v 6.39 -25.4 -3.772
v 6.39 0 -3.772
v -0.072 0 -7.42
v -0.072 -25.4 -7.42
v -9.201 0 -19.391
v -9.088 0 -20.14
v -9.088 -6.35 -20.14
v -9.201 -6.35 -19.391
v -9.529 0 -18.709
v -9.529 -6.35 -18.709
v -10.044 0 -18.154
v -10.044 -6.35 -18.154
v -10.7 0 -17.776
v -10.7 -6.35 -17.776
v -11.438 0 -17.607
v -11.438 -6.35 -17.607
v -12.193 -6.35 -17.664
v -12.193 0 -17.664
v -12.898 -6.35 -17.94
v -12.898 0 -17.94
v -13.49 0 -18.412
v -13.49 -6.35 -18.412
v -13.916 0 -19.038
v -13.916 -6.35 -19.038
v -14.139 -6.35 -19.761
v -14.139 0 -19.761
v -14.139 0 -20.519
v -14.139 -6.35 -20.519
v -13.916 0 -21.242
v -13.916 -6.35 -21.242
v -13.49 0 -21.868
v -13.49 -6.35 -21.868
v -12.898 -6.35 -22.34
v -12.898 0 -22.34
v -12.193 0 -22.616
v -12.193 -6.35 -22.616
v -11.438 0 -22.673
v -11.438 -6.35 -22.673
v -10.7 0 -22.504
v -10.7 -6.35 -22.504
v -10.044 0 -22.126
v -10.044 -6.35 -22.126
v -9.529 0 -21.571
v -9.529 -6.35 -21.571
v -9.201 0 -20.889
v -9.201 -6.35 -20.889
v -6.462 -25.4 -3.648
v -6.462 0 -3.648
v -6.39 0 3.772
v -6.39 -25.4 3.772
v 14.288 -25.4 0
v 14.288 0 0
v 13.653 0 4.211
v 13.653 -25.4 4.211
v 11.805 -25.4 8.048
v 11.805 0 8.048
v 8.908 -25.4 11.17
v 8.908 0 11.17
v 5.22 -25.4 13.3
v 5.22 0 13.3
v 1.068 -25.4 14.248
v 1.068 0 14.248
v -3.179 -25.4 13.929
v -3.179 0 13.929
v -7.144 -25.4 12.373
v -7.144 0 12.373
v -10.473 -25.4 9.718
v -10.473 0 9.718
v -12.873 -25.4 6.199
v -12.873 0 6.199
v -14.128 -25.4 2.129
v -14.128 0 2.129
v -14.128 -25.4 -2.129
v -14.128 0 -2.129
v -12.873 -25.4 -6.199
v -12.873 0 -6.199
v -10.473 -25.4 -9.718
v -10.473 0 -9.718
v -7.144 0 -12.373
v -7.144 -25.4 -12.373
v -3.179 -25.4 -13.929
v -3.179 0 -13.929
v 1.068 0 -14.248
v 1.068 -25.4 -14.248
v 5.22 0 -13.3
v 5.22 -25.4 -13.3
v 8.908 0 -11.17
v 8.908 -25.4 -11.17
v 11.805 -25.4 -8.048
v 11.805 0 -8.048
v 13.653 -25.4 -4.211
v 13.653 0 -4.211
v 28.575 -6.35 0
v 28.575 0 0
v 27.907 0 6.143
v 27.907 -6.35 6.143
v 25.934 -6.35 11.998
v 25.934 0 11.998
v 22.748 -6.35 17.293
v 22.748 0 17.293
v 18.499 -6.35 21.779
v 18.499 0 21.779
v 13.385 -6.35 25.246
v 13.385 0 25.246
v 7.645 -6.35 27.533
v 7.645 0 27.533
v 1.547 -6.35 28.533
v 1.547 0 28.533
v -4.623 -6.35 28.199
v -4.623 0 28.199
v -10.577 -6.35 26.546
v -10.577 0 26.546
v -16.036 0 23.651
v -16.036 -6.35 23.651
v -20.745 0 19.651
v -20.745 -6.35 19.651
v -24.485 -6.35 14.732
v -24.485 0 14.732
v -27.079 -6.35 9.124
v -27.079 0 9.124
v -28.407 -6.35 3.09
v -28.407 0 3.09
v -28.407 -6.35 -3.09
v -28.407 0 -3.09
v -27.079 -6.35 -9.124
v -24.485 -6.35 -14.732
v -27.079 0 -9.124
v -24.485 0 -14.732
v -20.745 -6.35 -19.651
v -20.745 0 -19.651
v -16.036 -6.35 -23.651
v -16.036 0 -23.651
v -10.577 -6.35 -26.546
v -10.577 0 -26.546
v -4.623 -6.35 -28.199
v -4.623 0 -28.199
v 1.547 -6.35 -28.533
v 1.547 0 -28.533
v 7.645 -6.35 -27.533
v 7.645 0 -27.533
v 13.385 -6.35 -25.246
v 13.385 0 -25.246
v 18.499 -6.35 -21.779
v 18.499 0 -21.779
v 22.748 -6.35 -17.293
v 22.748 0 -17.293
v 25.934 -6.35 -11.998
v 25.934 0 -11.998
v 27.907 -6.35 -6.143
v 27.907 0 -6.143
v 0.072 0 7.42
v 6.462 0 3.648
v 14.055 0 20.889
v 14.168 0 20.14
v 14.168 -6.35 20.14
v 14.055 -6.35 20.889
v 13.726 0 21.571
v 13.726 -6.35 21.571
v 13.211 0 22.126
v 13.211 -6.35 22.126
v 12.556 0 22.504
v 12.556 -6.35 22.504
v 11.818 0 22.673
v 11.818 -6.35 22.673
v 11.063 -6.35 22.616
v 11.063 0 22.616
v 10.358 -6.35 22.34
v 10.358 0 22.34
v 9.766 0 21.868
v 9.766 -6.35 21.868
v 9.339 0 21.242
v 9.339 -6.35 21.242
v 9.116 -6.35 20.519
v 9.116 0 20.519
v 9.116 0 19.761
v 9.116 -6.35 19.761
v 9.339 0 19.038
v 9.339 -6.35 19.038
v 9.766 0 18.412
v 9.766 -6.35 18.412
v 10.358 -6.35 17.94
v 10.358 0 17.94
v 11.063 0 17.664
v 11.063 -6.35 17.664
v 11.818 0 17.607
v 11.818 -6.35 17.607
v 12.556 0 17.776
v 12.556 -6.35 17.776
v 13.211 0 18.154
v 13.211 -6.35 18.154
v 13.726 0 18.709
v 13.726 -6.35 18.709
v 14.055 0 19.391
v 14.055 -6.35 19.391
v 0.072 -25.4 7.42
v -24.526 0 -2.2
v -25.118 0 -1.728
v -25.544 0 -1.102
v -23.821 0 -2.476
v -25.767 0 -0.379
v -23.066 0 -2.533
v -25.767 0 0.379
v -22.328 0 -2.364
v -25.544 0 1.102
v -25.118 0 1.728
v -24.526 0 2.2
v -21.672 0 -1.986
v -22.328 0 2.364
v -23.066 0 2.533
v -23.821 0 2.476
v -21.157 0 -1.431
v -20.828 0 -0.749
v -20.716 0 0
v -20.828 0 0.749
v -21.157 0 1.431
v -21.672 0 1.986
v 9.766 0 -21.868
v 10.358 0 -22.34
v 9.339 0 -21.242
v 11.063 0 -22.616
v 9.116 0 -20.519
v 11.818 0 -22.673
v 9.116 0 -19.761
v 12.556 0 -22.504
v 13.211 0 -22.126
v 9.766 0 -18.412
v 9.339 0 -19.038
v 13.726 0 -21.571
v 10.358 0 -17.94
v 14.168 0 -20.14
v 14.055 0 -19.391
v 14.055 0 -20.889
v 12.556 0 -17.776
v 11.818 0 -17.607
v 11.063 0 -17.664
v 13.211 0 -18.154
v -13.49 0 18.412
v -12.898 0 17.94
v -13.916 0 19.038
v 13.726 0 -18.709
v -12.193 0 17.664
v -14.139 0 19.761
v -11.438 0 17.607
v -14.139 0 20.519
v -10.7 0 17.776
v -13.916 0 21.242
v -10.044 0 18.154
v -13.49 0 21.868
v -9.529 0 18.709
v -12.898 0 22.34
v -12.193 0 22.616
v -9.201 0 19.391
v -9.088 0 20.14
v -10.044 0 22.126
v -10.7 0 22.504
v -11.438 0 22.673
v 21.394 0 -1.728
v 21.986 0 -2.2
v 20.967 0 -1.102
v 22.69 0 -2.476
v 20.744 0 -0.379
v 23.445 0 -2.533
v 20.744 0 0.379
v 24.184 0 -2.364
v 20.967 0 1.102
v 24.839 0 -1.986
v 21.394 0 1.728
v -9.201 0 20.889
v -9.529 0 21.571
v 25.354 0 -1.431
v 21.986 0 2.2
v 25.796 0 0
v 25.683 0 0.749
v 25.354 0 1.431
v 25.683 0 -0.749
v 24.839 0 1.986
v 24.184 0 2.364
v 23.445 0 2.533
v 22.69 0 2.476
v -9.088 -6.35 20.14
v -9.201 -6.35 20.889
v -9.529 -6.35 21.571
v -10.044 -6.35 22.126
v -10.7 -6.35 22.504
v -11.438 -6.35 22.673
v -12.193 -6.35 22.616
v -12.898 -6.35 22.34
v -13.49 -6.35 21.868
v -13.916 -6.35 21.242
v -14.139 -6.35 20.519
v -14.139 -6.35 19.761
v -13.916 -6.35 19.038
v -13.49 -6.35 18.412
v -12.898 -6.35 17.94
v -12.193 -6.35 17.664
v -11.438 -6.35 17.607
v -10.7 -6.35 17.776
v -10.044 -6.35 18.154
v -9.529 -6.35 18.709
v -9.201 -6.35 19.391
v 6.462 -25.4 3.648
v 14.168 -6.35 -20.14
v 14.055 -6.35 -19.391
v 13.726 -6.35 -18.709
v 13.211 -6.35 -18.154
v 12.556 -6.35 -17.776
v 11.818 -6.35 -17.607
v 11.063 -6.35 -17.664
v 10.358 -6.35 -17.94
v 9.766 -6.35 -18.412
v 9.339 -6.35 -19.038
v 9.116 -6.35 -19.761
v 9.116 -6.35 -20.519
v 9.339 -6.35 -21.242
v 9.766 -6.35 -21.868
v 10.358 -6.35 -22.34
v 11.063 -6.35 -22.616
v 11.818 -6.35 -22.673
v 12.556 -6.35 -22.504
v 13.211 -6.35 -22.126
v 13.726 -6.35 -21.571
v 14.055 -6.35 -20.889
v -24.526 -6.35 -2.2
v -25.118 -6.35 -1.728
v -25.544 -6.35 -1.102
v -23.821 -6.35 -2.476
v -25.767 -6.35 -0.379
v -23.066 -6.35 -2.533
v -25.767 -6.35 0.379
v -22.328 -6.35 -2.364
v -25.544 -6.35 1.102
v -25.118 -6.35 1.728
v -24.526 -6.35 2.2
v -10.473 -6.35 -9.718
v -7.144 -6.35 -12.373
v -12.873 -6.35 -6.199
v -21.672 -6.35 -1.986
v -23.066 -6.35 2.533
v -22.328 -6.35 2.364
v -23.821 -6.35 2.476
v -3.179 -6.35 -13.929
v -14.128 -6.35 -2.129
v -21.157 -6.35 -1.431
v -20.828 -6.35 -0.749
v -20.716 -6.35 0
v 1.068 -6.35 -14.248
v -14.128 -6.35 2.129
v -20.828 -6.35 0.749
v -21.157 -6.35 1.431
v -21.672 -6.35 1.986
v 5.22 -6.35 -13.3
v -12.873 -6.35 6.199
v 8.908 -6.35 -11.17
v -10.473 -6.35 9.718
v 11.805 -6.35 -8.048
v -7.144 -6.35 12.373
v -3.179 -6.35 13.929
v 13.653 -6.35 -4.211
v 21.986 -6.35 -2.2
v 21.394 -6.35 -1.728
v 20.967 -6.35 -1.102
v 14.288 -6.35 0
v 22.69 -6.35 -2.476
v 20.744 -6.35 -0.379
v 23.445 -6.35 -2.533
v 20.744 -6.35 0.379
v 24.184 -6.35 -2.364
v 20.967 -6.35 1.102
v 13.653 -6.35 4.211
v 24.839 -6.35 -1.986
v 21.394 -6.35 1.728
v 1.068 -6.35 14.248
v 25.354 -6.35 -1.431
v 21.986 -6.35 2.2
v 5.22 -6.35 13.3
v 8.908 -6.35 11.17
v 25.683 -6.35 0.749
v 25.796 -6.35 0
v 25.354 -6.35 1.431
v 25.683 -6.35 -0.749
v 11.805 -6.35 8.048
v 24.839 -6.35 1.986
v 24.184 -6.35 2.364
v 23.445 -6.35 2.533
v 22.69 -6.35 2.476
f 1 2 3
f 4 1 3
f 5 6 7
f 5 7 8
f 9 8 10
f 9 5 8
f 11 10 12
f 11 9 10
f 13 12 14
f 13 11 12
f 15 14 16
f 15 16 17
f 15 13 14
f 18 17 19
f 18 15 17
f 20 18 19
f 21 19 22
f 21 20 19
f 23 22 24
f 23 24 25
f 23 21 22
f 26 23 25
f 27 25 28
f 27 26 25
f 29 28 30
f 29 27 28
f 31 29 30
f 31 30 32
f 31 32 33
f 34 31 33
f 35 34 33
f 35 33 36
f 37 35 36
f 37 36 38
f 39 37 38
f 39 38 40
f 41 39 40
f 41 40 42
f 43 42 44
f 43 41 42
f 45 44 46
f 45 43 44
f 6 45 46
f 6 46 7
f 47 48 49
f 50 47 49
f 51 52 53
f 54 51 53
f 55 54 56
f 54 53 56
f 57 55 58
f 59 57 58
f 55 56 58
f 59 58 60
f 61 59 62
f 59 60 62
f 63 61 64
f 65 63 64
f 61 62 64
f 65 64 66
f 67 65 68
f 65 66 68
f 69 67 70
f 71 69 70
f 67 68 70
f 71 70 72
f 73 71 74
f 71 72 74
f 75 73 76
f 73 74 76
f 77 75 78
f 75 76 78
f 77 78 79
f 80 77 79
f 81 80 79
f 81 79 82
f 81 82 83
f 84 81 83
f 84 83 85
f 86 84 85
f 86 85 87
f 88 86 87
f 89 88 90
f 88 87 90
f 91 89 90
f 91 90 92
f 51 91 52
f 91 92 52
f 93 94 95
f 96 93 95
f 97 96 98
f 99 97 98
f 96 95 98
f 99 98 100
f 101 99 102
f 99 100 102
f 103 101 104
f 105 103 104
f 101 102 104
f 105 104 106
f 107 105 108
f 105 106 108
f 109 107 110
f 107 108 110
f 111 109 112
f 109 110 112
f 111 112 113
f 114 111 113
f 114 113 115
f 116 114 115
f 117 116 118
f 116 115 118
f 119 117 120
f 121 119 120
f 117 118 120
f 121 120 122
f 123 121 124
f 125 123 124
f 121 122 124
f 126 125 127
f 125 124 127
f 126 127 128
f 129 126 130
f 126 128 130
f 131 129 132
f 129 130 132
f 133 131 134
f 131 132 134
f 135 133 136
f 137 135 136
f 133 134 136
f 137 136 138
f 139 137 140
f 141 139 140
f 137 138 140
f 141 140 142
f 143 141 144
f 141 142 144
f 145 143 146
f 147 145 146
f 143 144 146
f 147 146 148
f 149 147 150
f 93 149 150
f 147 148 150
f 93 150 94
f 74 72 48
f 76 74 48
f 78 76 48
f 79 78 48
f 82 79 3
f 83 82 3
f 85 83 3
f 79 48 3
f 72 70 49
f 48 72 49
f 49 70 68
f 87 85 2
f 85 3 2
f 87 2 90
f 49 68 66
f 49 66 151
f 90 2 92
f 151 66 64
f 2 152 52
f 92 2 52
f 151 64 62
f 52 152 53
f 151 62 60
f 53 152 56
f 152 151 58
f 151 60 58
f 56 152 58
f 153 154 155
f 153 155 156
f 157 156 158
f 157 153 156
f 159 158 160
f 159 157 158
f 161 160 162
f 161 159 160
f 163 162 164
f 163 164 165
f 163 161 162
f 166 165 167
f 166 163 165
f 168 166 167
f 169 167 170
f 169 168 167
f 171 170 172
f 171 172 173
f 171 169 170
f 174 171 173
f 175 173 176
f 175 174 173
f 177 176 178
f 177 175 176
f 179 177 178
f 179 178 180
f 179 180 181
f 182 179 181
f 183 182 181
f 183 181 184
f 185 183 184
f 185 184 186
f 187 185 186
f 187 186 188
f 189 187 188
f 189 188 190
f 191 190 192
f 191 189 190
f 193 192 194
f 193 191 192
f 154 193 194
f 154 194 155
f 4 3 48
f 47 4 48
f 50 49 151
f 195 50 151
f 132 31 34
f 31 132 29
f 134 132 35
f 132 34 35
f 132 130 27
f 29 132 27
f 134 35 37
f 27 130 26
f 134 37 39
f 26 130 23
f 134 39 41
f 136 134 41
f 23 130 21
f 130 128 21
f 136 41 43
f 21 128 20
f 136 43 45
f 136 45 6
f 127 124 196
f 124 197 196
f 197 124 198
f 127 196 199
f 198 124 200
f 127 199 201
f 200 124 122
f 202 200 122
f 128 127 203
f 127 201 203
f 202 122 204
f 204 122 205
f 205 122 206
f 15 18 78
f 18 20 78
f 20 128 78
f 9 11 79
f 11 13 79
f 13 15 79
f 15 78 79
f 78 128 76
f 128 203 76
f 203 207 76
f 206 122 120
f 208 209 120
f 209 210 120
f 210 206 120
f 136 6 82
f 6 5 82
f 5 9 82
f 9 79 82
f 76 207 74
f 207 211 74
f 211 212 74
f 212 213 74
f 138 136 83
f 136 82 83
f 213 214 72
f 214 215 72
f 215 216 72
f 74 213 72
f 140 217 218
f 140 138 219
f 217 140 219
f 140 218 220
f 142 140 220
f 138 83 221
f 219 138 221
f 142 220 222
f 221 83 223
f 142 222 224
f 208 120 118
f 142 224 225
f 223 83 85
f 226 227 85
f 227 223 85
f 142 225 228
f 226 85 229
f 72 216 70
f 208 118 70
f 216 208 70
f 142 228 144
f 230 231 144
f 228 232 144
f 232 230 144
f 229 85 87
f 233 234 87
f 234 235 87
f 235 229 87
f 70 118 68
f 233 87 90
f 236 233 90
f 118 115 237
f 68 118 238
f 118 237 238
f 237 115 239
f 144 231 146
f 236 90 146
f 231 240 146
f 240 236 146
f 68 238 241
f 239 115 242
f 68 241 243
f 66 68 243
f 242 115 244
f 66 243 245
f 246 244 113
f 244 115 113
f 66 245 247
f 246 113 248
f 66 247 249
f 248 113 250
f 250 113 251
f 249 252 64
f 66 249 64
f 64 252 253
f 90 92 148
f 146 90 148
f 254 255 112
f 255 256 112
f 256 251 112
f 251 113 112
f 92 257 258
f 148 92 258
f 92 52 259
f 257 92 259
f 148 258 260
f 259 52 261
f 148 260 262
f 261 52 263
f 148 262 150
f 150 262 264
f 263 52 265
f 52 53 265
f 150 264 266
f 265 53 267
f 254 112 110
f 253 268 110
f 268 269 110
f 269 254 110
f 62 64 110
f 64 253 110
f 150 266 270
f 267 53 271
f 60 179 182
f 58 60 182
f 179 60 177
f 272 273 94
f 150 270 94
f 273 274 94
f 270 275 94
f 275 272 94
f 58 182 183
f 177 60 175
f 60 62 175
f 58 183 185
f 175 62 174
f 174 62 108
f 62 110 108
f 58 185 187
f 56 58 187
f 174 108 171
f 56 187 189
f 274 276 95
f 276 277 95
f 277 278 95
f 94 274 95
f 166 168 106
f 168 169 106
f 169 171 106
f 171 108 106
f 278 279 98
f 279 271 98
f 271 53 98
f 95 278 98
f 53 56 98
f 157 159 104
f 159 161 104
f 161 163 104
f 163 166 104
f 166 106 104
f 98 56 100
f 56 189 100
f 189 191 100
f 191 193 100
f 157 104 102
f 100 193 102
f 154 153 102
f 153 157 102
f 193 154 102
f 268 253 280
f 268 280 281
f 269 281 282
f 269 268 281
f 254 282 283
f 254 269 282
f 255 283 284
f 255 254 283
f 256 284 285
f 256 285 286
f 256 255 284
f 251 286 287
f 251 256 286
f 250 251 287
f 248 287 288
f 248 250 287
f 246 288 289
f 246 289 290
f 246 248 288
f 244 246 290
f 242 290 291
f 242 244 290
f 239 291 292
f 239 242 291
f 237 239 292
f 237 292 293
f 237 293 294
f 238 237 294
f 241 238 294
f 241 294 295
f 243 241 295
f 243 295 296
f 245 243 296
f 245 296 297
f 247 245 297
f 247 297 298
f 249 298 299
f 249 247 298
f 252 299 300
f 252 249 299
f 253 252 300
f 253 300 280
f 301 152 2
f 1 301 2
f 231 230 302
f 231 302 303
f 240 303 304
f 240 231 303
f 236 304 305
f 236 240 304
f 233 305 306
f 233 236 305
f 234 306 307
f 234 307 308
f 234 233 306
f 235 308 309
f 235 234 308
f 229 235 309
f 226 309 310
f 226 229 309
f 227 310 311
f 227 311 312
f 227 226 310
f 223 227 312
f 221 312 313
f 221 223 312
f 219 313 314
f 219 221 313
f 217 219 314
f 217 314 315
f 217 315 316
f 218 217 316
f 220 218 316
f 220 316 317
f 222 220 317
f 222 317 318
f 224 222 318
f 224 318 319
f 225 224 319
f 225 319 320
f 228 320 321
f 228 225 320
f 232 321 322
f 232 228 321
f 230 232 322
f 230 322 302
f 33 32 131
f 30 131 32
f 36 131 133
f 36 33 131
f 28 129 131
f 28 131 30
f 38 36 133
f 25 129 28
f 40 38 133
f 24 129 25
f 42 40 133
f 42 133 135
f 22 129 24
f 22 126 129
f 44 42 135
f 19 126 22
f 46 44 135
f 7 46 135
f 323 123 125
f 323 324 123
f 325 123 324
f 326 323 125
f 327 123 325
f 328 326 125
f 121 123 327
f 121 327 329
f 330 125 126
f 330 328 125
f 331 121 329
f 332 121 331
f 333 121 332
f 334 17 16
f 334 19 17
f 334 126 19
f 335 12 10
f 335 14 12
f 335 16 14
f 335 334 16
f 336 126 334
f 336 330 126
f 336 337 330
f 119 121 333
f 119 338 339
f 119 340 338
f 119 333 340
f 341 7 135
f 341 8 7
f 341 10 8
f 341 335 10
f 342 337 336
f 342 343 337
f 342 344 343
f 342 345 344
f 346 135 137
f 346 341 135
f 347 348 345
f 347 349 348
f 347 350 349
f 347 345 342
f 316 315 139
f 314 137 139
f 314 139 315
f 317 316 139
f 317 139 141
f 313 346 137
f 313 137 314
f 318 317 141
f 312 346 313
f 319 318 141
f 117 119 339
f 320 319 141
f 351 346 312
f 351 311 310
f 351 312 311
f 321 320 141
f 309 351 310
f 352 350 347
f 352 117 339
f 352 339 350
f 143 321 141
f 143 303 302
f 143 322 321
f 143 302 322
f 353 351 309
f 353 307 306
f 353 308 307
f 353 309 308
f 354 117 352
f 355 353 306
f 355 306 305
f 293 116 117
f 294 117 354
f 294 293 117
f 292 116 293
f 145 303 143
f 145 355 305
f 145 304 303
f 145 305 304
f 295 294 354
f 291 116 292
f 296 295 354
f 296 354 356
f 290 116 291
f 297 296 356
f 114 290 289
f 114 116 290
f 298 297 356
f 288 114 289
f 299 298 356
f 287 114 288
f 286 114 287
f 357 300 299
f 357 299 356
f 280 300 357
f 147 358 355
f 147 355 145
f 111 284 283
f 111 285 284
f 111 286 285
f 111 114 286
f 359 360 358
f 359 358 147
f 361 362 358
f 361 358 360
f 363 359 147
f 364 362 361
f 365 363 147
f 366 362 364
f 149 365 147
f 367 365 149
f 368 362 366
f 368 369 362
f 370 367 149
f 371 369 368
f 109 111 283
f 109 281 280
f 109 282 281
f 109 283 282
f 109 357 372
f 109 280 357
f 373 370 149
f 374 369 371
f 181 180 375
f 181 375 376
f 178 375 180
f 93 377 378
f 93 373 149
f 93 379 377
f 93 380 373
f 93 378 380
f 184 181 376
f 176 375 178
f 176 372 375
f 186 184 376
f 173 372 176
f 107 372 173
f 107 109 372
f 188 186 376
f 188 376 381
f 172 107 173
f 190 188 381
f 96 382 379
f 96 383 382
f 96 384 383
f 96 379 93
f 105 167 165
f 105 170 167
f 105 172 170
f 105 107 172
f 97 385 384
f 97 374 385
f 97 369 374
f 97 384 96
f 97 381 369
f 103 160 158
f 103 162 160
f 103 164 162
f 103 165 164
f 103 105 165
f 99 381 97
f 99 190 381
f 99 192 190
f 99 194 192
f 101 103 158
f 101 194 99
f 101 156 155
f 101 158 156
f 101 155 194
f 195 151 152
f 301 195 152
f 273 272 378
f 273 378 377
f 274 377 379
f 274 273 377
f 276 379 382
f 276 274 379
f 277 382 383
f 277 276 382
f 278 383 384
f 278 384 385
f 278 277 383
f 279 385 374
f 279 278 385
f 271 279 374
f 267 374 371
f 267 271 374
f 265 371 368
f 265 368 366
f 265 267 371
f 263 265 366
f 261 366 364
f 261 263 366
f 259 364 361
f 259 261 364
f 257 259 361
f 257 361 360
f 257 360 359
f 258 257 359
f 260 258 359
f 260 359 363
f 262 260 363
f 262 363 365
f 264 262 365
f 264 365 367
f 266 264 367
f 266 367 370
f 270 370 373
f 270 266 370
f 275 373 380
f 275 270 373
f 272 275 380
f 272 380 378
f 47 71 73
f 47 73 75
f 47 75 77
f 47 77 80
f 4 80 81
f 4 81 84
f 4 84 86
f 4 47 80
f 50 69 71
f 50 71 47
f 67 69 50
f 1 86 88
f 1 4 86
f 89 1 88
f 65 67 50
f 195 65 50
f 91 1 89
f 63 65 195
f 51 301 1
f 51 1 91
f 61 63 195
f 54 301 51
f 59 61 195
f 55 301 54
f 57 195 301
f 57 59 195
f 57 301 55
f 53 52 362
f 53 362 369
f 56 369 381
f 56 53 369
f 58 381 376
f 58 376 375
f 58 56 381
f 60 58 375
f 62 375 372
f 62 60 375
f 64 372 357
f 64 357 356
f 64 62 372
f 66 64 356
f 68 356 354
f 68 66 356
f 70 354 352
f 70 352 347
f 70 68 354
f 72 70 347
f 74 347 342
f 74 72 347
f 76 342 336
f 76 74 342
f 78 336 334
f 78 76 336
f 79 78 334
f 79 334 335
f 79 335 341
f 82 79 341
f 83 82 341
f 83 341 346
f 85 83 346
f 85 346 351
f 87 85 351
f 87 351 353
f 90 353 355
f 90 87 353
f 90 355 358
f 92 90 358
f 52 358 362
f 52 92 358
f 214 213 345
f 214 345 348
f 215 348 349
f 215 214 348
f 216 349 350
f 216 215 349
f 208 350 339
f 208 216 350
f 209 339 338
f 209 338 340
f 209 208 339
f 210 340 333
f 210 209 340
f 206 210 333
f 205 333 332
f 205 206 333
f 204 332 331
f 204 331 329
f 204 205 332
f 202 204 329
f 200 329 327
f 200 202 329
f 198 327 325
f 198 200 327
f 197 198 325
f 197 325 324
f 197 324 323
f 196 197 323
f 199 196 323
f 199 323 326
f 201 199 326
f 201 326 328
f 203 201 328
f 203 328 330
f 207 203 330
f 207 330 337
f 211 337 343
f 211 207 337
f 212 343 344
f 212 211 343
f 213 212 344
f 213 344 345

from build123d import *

# Parameters (mm, degrees)
F0_R     = 14.2875
F1_DEPTH = 25.4
F0_R_2   = 28.575
F0_R_3   = 2.54
F2_DEPTH = 6.35


# Not quite as in the source:
# - the program builds the solid bodies; features that only make, move or delete a surface that nothing else refers to are left out


with BuildPart() as f1:
    # F0 (on Front) → F1 (new body)
    with BuildSketch(Plane.XZ):
        Circle(F0_R)
        Polygon((-6.4620758334, -3.6480295337), (-6.3903241666, 3.772307066), (0.0717516667, 7.4203365997), (6.4620758334, 3.6480295337), (6.3903241666, -3.772307066), (-0.0717516667, -7.4203365997), align=None, mode=Mode.SUBTRACT)
    extrude(amount=F1_DEPTH)


with BuildPart() as f2:
    # F0 (on Front) → F2 (new body)
    with BuildSketch(Plane.XZ):
        Circle(F0_R_2)
        with Locations((-11.6278267134, -20.1399866492)):
            Circle(F0_R_3, mode=Mode.SUBTRACT)
        with Locations((11.6278267134, -20.1399866492)):
            Circle(F0_R_3, mode=Mode.SUBTRACT)
        with Locations((-23.2556534267, 0)):
            Circle(F0_R_3, mode=Mode.SUBTRACT)
        with Locations((-11.6278267134, 20.1399866492)):
            Circle(F0_R_3, mode=Mode.SUBTRACT)
        Circle(F0_R, mode=Mode.SUBTRACT)
        with Locations((23.2556534267, 0)):
            Circle(F0_R_3, mode=Mode.SUBTRACT)
        with Locations((11.6278267134, 20.1399866492)):
            Circle(F0_R_3, mode=Mode.SUBTRACT)
    extrude(amount=F2_DEPTH)


solid = Compound([f1.part, f2.part])
